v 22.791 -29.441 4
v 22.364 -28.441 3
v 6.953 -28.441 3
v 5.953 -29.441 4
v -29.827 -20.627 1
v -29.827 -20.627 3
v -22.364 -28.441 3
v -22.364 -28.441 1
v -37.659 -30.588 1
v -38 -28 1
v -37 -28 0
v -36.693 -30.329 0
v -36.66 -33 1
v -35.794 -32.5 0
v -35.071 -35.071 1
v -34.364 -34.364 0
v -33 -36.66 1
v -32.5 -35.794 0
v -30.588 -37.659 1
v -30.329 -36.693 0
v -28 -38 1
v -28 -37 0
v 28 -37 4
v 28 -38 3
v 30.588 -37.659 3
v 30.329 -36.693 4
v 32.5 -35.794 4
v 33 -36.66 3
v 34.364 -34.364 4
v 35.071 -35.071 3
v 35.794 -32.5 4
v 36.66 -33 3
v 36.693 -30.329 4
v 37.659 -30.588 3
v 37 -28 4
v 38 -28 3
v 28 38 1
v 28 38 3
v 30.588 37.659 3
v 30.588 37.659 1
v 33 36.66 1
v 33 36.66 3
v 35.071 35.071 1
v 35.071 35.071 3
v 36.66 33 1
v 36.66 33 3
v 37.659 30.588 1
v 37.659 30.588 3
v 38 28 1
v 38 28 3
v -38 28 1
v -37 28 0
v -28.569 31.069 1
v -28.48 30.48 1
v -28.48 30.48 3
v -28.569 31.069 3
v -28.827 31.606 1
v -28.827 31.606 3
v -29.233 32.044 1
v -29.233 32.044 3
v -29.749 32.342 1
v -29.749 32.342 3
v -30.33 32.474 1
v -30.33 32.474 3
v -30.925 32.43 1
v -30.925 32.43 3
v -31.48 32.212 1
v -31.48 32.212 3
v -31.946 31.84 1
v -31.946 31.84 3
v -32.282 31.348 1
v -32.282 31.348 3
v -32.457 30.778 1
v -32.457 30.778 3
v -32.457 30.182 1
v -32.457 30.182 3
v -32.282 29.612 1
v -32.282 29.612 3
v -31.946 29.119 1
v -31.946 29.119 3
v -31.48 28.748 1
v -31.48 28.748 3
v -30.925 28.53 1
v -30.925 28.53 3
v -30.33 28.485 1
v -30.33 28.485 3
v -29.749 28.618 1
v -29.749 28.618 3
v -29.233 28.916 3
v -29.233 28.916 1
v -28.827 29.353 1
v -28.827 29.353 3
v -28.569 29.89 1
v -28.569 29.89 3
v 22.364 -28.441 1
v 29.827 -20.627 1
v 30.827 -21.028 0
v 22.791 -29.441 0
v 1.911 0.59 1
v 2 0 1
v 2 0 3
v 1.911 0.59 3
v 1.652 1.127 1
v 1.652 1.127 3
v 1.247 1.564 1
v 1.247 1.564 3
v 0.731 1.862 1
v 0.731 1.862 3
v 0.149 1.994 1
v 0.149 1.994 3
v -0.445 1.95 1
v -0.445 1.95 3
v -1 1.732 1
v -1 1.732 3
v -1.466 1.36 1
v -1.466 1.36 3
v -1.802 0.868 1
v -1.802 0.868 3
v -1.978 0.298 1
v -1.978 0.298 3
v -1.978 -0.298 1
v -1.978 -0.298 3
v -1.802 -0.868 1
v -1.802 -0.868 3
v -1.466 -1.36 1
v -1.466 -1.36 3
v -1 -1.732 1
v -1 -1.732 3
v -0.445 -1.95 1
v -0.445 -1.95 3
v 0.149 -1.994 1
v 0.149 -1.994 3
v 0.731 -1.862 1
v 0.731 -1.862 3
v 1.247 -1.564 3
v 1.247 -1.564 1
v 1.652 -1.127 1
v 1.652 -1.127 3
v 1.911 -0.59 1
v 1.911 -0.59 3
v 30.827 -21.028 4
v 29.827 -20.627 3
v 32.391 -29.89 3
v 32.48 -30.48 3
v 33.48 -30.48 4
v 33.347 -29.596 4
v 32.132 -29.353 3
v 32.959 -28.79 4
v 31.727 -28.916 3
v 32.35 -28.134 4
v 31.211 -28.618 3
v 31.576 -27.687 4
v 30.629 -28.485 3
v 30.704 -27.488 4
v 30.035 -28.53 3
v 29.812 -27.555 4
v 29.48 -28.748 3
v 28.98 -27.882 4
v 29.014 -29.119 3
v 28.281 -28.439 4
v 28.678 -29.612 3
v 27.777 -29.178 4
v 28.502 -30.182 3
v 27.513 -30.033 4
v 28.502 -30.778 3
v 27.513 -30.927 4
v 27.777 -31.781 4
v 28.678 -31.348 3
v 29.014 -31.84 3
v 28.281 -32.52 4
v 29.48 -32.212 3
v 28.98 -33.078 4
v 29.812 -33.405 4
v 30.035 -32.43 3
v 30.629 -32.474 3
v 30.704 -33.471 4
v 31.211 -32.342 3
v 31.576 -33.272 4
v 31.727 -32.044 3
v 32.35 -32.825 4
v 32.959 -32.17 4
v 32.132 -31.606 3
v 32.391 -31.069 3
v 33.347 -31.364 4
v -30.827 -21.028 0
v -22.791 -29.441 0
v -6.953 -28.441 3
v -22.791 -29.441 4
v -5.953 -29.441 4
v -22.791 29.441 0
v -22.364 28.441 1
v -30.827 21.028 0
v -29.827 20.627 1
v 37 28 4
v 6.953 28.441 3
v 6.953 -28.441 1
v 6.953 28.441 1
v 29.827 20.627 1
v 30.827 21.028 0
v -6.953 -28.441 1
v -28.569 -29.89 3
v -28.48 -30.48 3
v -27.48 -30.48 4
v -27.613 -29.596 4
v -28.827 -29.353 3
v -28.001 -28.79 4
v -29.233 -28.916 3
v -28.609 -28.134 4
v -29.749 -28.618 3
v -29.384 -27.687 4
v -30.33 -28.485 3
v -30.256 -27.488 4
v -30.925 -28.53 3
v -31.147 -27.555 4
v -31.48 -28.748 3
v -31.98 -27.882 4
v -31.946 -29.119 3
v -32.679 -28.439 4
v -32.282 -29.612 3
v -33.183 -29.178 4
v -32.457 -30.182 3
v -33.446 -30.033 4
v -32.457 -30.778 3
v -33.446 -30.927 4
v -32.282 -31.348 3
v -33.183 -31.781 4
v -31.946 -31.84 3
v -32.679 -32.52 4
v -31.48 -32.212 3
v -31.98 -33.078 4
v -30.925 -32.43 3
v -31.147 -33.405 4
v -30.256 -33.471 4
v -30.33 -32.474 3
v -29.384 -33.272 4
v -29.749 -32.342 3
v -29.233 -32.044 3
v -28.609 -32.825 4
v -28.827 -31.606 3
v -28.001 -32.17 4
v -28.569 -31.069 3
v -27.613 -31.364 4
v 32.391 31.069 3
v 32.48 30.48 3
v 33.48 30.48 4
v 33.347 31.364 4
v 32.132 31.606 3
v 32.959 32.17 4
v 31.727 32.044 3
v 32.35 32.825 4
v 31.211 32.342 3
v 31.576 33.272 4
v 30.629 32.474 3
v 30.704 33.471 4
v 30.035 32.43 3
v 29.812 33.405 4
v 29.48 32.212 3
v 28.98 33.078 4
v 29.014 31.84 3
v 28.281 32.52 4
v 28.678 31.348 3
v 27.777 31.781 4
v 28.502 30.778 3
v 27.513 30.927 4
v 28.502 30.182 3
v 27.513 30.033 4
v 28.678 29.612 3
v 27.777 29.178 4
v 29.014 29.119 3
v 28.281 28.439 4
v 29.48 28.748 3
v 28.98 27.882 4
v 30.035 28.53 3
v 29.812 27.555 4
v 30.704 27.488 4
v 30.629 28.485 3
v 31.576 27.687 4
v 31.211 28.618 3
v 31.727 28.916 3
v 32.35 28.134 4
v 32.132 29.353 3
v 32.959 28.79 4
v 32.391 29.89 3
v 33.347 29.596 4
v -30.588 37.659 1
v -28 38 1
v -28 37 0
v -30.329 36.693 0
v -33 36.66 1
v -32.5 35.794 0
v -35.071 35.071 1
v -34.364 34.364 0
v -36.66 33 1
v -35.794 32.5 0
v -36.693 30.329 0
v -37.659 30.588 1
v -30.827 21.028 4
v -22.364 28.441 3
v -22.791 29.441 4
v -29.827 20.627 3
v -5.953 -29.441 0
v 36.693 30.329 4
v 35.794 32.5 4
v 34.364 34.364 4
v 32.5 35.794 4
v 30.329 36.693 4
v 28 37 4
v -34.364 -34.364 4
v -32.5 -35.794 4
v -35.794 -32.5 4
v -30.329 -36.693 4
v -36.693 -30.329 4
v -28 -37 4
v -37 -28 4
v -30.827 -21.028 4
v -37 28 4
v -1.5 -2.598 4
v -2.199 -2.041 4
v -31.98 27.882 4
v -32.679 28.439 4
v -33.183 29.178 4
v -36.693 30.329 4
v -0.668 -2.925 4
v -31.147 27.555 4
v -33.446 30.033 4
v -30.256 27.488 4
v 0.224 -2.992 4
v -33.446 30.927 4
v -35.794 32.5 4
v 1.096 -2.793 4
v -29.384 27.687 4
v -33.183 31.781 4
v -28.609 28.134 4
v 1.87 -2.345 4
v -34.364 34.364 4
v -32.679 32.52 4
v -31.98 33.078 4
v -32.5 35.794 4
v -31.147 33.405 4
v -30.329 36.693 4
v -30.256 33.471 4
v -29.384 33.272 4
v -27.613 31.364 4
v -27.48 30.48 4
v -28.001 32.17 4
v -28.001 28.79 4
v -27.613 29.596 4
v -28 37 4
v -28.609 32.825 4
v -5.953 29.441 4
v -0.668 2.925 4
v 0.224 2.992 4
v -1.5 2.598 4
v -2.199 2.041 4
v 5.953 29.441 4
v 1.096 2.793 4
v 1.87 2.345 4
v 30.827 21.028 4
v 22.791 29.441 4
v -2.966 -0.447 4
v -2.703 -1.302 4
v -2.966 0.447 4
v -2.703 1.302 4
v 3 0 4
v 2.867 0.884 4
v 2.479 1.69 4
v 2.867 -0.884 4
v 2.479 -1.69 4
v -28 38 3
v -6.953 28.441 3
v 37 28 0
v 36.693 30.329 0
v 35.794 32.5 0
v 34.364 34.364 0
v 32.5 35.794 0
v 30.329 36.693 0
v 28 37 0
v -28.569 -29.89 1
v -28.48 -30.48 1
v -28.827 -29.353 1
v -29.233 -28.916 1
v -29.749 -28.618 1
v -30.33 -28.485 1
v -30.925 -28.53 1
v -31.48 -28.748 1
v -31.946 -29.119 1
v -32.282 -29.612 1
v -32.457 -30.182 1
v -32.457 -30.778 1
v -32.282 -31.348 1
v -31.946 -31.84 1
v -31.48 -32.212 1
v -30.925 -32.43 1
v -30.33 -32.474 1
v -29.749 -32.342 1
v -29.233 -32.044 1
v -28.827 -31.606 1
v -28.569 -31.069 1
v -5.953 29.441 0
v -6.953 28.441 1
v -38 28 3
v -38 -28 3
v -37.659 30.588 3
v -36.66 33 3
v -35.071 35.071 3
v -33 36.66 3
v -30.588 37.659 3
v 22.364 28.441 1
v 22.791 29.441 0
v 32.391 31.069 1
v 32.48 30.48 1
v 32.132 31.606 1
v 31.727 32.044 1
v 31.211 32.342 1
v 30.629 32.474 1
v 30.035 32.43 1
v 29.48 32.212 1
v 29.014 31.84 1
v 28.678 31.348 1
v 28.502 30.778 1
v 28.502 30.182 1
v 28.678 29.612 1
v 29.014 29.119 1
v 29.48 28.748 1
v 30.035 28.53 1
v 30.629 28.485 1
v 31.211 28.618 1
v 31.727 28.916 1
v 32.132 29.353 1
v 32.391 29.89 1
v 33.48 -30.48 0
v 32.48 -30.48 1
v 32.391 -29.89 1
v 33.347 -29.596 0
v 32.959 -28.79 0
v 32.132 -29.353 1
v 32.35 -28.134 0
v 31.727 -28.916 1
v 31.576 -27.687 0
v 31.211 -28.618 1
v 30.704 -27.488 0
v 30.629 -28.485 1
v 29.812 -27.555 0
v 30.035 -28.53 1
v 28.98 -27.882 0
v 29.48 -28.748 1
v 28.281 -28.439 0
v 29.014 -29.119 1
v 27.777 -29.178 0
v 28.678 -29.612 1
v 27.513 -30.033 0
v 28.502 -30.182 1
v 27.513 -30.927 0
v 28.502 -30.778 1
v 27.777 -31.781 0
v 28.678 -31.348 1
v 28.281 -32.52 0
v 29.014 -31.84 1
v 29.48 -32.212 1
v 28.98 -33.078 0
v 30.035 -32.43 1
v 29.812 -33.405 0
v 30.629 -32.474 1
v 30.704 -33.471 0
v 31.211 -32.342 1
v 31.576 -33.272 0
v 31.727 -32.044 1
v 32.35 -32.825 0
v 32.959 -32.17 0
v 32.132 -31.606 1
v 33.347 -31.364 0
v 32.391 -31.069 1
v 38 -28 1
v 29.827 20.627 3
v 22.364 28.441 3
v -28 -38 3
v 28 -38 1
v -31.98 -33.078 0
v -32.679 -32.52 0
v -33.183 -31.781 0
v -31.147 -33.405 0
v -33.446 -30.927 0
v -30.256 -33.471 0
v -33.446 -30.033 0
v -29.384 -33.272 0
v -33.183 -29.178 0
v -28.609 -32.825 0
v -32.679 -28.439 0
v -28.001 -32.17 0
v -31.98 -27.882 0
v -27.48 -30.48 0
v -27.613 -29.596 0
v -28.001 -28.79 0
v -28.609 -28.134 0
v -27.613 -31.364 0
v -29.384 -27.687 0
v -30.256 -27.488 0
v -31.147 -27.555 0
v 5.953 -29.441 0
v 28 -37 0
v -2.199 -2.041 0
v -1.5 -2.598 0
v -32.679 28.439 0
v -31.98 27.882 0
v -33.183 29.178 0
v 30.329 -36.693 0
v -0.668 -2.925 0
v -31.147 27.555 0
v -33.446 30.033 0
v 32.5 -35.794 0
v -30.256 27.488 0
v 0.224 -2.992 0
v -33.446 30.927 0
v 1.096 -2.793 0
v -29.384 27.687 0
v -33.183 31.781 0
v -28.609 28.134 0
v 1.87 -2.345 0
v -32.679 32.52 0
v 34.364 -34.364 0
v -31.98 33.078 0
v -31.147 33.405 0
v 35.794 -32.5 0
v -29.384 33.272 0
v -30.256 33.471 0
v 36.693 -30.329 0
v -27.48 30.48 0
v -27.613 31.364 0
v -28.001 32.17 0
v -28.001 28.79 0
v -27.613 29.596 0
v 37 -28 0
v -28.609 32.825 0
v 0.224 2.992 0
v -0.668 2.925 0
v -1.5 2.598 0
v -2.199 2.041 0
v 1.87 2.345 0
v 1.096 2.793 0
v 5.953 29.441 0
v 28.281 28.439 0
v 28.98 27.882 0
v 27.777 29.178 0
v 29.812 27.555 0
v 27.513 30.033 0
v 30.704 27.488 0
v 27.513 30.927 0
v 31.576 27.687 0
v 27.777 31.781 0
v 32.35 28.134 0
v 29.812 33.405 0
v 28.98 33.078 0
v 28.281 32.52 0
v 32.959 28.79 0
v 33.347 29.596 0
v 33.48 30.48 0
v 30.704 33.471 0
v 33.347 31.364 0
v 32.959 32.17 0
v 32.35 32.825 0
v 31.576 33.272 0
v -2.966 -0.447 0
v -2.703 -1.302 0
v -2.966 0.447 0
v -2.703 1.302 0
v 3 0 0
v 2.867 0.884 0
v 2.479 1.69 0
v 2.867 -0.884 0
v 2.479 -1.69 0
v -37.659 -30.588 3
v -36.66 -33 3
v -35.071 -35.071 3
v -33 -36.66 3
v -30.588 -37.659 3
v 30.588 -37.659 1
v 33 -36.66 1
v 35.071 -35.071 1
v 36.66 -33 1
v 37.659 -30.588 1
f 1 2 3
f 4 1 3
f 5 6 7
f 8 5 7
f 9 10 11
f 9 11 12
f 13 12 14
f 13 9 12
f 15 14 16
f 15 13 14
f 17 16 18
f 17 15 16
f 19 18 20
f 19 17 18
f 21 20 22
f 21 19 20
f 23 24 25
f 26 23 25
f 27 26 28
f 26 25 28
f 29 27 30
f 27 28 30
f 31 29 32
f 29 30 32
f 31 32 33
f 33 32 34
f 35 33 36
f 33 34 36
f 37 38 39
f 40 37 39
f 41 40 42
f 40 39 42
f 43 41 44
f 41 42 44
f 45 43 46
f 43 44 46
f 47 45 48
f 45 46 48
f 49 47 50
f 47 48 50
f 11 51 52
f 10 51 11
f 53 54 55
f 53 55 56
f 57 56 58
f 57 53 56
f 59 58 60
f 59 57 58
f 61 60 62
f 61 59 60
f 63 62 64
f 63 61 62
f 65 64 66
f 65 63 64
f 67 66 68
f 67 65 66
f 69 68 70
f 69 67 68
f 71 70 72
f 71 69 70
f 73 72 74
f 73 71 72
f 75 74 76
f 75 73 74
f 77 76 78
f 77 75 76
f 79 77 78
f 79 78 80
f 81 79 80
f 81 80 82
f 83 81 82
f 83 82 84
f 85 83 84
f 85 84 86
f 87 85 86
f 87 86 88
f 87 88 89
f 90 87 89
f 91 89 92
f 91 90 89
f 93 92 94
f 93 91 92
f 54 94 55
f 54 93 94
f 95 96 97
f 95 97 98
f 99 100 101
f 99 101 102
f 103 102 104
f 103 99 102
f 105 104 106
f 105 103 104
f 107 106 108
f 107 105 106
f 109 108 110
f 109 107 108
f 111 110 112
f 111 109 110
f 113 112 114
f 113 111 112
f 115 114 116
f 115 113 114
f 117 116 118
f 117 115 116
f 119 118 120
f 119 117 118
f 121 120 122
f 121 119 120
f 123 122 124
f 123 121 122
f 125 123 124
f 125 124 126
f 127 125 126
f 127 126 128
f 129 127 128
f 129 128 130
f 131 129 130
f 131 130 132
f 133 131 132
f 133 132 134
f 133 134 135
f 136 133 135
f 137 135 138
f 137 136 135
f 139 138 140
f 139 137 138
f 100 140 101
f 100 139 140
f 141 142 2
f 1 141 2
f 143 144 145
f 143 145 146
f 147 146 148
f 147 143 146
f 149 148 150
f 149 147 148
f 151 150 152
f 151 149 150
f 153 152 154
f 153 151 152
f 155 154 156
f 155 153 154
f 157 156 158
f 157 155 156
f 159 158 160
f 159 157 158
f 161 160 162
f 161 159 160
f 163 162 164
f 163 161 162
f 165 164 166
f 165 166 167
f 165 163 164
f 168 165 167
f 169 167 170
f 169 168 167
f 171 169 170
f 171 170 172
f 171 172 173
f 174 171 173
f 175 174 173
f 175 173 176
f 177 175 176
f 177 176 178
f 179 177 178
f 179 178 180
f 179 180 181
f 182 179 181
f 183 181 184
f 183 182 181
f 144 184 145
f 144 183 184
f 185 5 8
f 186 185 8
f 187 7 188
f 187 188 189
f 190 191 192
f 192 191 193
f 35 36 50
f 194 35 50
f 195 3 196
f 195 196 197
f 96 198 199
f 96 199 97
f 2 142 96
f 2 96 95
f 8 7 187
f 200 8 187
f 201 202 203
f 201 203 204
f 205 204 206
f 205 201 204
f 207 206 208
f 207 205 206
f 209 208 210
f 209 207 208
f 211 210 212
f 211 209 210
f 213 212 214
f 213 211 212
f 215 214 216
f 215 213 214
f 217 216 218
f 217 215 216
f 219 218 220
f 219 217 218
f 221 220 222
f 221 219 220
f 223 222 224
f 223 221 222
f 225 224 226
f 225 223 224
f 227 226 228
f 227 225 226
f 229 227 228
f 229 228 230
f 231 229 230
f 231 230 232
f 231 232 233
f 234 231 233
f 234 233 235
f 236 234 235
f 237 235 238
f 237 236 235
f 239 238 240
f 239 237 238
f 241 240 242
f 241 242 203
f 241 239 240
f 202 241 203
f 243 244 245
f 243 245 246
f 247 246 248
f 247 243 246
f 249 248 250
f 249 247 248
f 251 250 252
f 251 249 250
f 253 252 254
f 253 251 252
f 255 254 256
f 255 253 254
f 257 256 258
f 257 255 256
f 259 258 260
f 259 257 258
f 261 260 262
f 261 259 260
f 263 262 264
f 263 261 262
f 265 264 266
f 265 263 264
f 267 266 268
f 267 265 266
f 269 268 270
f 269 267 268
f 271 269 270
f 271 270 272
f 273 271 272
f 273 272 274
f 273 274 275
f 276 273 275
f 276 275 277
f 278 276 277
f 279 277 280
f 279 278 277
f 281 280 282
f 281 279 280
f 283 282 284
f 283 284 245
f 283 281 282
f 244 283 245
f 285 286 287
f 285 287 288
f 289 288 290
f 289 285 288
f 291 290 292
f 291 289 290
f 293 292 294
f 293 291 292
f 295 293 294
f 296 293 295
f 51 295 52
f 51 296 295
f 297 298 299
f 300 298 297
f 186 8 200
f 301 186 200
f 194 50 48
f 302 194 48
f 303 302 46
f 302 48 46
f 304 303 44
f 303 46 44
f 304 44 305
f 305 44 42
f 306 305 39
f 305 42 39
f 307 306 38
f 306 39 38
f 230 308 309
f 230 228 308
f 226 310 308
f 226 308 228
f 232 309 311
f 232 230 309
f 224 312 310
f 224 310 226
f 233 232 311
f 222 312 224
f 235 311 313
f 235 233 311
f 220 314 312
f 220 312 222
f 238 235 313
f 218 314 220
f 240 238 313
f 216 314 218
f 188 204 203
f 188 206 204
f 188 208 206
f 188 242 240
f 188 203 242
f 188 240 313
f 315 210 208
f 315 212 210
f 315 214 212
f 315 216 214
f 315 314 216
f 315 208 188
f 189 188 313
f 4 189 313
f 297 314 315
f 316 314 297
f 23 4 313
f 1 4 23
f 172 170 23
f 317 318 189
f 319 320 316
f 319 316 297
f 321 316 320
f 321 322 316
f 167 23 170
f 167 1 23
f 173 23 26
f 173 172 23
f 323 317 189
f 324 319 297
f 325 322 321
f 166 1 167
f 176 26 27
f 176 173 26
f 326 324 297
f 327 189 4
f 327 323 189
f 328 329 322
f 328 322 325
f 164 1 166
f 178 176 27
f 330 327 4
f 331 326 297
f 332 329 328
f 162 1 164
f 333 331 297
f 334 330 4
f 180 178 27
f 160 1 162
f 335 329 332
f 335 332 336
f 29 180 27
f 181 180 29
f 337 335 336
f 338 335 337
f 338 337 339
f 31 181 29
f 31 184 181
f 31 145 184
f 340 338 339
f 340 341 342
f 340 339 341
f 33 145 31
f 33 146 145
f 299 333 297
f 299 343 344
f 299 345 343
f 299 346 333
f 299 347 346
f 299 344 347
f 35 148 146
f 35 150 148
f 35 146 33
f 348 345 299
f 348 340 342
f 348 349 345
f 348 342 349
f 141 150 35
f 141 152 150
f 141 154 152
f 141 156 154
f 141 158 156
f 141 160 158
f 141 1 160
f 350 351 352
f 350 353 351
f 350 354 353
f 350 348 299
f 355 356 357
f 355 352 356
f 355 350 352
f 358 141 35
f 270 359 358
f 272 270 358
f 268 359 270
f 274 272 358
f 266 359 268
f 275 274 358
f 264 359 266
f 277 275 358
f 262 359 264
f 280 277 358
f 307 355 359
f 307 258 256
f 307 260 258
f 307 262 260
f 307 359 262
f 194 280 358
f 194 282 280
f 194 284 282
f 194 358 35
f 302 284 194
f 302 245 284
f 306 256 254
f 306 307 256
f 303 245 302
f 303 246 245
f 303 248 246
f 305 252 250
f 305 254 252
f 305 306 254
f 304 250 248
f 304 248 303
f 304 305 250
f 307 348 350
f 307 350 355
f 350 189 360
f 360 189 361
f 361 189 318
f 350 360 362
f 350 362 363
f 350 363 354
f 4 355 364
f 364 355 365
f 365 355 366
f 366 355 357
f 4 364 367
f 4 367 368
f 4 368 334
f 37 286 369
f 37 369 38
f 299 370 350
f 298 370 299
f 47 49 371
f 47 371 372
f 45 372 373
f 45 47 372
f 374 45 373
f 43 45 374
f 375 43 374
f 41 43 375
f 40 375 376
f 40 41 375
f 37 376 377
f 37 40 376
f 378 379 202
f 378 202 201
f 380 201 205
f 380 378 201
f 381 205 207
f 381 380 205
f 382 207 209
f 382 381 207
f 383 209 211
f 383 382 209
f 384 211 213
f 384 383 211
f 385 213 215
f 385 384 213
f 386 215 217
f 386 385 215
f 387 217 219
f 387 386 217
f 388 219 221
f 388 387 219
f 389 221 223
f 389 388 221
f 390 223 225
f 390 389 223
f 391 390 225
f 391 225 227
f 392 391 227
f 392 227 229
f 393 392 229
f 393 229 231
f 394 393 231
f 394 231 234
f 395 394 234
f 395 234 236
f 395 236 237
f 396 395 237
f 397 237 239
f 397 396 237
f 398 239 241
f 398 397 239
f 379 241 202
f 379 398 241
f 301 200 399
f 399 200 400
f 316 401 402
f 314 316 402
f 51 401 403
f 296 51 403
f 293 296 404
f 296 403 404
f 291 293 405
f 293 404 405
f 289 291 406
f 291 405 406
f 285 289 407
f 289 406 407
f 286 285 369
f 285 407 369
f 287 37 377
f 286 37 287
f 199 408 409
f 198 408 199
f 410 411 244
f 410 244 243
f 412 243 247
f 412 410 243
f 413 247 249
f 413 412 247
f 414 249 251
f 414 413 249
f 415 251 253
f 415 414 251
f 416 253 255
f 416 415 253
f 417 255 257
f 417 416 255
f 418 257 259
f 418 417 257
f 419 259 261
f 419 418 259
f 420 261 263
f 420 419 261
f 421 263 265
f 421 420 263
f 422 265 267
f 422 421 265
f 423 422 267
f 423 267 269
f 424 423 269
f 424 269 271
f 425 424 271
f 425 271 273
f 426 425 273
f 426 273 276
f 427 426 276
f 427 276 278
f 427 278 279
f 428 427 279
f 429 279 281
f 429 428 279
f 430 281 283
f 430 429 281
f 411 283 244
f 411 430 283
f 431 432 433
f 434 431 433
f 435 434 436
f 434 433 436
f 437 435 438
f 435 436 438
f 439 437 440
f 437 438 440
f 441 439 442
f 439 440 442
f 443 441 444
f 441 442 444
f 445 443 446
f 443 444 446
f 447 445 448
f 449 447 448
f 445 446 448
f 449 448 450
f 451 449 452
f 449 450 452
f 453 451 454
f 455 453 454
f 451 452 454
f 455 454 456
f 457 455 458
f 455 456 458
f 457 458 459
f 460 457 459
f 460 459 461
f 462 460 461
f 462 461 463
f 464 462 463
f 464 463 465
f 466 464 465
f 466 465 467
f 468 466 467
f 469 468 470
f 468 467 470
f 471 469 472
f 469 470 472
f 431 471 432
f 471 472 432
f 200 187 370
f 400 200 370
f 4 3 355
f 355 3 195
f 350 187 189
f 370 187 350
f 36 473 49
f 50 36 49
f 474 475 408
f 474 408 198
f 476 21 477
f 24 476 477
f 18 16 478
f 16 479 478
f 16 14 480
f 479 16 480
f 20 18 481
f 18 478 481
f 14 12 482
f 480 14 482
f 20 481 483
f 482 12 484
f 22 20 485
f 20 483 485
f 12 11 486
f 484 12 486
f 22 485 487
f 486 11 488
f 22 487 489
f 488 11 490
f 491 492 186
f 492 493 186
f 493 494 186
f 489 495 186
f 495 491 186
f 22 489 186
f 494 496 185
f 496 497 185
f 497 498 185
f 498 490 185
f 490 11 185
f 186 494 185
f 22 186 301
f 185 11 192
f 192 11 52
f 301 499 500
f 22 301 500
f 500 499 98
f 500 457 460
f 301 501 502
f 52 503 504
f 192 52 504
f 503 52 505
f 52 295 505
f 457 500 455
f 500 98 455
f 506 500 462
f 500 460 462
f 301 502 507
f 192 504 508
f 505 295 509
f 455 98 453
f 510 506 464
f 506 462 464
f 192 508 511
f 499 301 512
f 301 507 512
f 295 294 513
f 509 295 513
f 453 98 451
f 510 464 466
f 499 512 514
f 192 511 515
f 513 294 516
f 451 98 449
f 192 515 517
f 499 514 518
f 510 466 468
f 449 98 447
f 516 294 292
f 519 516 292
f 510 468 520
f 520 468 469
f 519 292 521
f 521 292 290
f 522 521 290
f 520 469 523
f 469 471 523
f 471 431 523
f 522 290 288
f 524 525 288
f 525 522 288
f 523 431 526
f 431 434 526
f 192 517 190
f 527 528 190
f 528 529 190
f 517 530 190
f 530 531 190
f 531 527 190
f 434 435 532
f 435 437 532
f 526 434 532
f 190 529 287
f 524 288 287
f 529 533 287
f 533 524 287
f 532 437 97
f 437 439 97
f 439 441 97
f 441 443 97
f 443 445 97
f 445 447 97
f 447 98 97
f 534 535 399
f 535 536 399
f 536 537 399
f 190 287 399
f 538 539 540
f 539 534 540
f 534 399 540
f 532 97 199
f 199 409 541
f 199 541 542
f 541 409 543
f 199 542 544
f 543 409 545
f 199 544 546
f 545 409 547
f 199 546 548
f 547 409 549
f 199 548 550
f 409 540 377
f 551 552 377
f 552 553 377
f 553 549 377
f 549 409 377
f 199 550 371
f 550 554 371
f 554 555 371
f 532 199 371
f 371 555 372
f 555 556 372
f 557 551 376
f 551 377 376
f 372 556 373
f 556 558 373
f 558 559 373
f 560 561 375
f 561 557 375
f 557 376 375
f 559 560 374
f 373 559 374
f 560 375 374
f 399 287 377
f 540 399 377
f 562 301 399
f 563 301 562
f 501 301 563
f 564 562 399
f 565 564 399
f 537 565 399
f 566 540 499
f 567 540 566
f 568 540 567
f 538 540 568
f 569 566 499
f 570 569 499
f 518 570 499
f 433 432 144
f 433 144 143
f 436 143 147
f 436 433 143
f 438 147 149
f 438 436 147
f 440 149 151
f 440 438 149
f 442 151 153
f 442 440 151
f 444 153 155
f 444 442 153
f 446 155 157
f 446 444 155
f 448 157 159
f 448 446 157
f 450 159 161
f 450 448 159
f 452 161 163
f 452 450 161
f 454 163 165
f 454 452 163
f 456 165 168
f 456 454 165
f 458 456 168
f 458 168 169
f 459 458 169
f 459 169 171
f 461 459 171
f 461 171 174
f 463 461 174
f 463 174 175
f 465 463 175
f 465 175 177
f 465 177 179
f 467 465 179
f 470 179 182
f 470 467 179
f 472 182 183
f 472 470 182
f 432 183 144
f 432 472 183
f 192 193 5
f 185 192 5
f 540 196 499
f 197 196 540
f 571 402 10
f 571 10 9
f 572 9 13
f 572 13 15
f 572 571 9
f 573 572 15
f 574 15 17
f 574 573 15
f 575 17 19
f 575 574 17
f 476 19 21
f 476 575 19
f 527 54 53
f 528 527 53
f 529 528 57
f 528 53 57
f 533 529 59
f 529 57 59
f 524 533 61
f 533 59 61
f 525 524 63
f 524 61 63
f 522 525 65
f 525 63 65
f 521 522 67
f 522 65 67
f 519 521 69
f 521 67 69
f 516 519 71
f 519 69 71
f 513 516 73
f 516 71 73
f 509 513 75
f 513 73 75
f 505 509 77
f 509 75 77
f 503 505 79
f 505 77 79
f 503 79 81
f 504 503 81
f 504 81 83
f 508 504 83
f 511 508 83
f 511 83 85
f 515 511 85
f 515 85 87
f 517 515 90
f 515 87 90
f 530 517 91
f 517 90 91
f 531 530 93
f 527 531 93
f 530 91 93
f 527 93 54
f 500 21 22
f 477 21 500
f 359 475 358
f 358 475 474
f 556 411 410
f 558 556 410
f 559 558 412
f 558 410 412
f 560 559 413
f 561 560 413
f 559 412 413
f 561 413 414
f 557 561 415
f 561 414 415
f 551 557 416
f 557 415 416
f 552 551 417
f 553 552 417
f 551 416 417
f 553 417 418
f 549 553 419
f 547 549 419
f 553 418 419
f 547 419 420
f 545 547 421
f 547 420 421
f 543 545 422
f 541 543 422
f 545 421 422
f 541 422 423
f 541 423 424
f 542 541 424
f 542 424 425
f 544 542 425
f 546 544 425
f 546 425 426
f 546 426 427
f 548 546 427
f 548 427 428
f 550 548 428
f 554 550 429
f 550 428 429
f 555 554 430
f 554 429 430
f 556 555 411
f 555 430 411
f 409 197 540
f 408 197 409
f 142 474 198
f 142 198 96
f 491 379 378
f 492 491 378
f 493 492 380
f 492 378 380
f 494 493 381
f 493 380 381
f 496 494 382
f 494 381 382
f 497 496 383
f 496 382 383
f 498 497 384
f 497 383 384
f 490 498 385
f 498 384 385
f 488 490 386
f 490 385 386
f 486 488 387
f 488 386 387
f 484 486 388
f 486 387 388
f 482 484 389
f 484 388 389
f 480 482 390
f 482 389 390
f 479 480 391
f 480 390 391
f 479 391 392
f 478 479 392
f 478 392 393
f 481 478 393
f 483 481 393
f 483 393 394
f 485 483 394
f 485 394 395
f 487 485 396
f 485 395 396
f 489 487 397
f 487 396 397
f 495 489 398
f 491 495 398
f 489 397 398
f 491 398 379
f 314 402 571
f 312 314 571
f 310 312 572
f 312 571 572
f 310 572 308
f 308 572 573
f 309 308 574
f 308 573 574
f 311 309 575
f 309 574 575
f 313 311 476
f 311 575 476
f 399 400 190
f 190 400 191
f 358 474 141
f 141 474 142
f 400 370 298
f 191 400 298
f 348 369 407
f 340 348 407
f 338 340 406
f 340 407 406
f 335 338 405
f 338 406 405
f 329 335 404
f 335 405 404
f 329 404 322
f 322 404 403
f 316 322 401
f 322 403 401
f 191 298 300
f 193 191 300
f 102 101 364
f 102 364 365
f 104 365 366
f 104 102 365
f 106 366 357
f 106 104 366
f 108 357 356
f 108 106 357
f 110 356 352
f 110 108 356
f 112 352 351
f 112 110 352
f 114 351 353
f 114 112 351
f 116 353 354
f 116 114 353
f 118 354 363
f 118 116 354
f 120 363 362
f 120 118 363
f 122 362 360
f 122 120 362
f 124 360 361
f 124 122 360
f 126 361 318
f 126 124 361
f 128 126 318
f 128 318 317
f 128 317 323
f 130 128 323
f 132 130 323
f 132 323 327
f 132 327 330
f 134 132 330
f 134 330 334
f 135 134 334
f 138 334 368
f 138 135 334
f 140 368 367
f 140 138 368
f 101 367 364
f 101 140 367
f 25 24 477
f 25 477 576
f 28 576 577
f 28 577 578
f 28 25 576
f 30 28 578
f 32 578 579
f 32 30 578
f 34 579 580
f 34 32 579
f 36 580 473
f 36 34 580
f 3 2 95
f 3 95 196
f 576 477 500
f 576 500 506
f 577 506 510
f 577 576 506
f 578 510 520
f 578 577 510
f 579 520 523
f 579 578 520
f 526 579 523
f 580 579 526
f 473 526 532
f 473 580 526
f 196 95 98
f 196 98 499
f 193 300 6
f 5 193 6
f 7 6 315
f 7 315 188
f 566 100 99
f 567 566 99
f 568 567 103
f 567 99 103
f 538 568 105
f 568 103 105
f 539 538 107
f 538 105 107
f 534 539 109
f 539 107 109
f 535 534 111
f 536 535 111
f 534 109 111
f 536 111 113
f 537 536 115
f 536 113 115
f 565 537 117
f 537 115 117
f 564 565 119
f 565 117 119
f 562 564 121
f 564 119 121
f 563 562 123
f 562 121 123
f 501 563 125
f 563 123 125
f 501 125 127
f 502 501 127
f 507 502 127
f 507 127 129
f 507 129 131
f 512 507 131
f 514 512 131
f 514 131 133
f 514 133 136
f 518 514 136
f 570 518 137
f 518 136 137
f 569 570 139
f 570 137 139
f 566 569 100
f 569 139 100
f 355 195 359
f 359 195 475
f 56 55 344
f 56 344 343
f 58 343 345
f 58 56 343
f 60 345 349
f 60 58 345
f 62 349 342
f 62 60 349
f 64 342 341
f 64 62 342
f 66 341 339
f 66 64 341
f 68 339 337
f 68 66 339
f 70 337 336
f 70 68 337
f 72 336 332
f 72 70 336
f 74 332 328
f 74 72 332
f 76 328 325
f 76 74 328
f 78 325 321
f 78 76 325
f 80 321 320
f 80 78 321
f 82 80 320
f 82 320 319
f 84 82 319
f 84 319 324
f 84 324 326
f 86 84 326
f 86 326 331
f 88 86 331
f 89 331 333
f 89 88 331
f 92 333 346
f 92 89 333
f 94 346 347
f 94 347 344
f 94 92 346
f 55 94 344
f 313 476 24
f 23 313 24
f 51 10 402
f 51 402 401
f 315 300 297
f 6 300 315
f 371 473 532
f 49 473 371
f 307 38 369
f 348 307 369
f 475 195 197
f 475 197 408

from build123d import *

# Parameters (mm, degrees)
SKETCH001_W  = 76
SKETCH001_H  = 76
SKETCH001_R  = 2
PAD_DEPTH    = 4
POCKET_DEPTH = 5
FILLET_R     = 10
CHAMFER_SIZE = 1


with BuildPart() as part:
    # Sketch001 → Pad (new body)
    with BuildSketch(Plane.XY):
        Rectangle(SKETCH001_W, SKETCH001_H)
        with Locations((-30.479838, 30.479838)):
            Circle(SKETCH001_R, mode=Mode.SUBTRACT)
        with Locations((30.479838, 30.479838)):
            Circle(SKETCH001_R, mode=Mode.SUBTRACT)
        with Locations((30.479838, -30.479838)):
            Circle(SKETCH001_R, mode=Mode.SUBTRACT)
        with Locations((-30.479838, -30.479838)):
            Circle(SKETCH001_R, mode=Mode.SUBTRACT)
        Circle(SKETCH001_R, mode=Mode.SUBTRACT)
    extrude(amount=PAD_DEPTH)

    # Sketch (on Face11 of Pad) → Pocket (cut)
    with BuildSketch(Plane.XY.offset(4)):
        Polygon((-29.826775, 20.627172), (-29.826775, -20.627172), (-22.363682, -28.4412), (-6.952969, -28.4412), (-6.952969, 28.4412), (-22.363682, 28.4412), align=None)
        Polygon((29.826775, 20.627172), (29.826775, -20.627172), (22.363682, -28.4412), (6.952969, -28.4412), (6.952969, 28.4412), (22.363682, 28.4412), align=None)
    extrude(amount=-POCKET_DEPTH, mode=Mode.SUBTRACT)

    # Fillet
    fillet_edges = [part.edges().sort_by_distance(p)[0] for p in [
        (38, -38, 2),
        (-38, -38, 2),
        (-38, 38, 2),
        (38, 38, 2),
    ]]
    fillet(fillet_edges, radius=FILLET_R)

    # Chamfer
    chamfer_edges = [part.edges().sort_by_distance(p)[0] for p in [
        (38, 0, 4),
        (35.071068, -35.071068, 4),
        (35.071068, 35.071068, 4),
        (0, -38, 4),
        (0, 38, 4),
        (-35.071068, -35.071068, 4),
        (-35.071068, 35.071068, 4),
        (-38, 0, 4),
        (-32.479838, -30.479838, 4),
        (28.479838, -30.479838, 4),
        (-29.826775, 0, 4),
        (-26.095228, -24.534186, 4),
        (-14.658325, -28.4412, 4),
        (-6.952969, 0, 4),
        (-14.658325, 28.4412, 4),
        (-26.095228, 24.534186, 4),
        (-32.479838, 30.479838, 4),
        (-2, 0, 4),
        (26.095228, 24.534186, 4),
        (14.658325, 28.4412, 4),
        (6.952969, 0, 4),
        (14.658325, -28.4412, 4),
        (26.095228, -24.534186, 4),
        (29.826775, 0, 4),
        (28.479838, 30.479838, 4),
        (38, 0, 0),
        (35.071068, -35.071068, 0),
        (35.071068, 35.071068, 0),
        (0, -38, 0),
        (0, 38, 0),
        (-35.071068, -35.071068, 0),
        (-35.071068, 35.071068, 0),
        (-38, 0, 0),
        (-32.479838, -30.479838, 0),
        (28.479838, -30.479838, 0),
        (-29.826775, 0, 0),
        (-26.095228, -24.534186, 0),
        (-14.658325, -28.4412, 0),
        (-6.952969, 0, 0),
        (-14.658325, 28.4412, 0),
        (-26.095228, 24.534186, 0),
        (-32.479838, 30.479838, 0),
        (-2, 0, 0),
        (26.095228, 24.534186, 0),
        (14.658325, 28.4412, 0),
        (6.952969, 0, 0),
        (14.658325, -28.4412, 0),
        (26.095228, -24.534186, 0),
        (29.826775, 0, 0),
        (28.479838, 30.479838, 0),
    ]]
    chamfer(chamfer_edges, length=CHAMFER_SIZE)


solid = part.part
